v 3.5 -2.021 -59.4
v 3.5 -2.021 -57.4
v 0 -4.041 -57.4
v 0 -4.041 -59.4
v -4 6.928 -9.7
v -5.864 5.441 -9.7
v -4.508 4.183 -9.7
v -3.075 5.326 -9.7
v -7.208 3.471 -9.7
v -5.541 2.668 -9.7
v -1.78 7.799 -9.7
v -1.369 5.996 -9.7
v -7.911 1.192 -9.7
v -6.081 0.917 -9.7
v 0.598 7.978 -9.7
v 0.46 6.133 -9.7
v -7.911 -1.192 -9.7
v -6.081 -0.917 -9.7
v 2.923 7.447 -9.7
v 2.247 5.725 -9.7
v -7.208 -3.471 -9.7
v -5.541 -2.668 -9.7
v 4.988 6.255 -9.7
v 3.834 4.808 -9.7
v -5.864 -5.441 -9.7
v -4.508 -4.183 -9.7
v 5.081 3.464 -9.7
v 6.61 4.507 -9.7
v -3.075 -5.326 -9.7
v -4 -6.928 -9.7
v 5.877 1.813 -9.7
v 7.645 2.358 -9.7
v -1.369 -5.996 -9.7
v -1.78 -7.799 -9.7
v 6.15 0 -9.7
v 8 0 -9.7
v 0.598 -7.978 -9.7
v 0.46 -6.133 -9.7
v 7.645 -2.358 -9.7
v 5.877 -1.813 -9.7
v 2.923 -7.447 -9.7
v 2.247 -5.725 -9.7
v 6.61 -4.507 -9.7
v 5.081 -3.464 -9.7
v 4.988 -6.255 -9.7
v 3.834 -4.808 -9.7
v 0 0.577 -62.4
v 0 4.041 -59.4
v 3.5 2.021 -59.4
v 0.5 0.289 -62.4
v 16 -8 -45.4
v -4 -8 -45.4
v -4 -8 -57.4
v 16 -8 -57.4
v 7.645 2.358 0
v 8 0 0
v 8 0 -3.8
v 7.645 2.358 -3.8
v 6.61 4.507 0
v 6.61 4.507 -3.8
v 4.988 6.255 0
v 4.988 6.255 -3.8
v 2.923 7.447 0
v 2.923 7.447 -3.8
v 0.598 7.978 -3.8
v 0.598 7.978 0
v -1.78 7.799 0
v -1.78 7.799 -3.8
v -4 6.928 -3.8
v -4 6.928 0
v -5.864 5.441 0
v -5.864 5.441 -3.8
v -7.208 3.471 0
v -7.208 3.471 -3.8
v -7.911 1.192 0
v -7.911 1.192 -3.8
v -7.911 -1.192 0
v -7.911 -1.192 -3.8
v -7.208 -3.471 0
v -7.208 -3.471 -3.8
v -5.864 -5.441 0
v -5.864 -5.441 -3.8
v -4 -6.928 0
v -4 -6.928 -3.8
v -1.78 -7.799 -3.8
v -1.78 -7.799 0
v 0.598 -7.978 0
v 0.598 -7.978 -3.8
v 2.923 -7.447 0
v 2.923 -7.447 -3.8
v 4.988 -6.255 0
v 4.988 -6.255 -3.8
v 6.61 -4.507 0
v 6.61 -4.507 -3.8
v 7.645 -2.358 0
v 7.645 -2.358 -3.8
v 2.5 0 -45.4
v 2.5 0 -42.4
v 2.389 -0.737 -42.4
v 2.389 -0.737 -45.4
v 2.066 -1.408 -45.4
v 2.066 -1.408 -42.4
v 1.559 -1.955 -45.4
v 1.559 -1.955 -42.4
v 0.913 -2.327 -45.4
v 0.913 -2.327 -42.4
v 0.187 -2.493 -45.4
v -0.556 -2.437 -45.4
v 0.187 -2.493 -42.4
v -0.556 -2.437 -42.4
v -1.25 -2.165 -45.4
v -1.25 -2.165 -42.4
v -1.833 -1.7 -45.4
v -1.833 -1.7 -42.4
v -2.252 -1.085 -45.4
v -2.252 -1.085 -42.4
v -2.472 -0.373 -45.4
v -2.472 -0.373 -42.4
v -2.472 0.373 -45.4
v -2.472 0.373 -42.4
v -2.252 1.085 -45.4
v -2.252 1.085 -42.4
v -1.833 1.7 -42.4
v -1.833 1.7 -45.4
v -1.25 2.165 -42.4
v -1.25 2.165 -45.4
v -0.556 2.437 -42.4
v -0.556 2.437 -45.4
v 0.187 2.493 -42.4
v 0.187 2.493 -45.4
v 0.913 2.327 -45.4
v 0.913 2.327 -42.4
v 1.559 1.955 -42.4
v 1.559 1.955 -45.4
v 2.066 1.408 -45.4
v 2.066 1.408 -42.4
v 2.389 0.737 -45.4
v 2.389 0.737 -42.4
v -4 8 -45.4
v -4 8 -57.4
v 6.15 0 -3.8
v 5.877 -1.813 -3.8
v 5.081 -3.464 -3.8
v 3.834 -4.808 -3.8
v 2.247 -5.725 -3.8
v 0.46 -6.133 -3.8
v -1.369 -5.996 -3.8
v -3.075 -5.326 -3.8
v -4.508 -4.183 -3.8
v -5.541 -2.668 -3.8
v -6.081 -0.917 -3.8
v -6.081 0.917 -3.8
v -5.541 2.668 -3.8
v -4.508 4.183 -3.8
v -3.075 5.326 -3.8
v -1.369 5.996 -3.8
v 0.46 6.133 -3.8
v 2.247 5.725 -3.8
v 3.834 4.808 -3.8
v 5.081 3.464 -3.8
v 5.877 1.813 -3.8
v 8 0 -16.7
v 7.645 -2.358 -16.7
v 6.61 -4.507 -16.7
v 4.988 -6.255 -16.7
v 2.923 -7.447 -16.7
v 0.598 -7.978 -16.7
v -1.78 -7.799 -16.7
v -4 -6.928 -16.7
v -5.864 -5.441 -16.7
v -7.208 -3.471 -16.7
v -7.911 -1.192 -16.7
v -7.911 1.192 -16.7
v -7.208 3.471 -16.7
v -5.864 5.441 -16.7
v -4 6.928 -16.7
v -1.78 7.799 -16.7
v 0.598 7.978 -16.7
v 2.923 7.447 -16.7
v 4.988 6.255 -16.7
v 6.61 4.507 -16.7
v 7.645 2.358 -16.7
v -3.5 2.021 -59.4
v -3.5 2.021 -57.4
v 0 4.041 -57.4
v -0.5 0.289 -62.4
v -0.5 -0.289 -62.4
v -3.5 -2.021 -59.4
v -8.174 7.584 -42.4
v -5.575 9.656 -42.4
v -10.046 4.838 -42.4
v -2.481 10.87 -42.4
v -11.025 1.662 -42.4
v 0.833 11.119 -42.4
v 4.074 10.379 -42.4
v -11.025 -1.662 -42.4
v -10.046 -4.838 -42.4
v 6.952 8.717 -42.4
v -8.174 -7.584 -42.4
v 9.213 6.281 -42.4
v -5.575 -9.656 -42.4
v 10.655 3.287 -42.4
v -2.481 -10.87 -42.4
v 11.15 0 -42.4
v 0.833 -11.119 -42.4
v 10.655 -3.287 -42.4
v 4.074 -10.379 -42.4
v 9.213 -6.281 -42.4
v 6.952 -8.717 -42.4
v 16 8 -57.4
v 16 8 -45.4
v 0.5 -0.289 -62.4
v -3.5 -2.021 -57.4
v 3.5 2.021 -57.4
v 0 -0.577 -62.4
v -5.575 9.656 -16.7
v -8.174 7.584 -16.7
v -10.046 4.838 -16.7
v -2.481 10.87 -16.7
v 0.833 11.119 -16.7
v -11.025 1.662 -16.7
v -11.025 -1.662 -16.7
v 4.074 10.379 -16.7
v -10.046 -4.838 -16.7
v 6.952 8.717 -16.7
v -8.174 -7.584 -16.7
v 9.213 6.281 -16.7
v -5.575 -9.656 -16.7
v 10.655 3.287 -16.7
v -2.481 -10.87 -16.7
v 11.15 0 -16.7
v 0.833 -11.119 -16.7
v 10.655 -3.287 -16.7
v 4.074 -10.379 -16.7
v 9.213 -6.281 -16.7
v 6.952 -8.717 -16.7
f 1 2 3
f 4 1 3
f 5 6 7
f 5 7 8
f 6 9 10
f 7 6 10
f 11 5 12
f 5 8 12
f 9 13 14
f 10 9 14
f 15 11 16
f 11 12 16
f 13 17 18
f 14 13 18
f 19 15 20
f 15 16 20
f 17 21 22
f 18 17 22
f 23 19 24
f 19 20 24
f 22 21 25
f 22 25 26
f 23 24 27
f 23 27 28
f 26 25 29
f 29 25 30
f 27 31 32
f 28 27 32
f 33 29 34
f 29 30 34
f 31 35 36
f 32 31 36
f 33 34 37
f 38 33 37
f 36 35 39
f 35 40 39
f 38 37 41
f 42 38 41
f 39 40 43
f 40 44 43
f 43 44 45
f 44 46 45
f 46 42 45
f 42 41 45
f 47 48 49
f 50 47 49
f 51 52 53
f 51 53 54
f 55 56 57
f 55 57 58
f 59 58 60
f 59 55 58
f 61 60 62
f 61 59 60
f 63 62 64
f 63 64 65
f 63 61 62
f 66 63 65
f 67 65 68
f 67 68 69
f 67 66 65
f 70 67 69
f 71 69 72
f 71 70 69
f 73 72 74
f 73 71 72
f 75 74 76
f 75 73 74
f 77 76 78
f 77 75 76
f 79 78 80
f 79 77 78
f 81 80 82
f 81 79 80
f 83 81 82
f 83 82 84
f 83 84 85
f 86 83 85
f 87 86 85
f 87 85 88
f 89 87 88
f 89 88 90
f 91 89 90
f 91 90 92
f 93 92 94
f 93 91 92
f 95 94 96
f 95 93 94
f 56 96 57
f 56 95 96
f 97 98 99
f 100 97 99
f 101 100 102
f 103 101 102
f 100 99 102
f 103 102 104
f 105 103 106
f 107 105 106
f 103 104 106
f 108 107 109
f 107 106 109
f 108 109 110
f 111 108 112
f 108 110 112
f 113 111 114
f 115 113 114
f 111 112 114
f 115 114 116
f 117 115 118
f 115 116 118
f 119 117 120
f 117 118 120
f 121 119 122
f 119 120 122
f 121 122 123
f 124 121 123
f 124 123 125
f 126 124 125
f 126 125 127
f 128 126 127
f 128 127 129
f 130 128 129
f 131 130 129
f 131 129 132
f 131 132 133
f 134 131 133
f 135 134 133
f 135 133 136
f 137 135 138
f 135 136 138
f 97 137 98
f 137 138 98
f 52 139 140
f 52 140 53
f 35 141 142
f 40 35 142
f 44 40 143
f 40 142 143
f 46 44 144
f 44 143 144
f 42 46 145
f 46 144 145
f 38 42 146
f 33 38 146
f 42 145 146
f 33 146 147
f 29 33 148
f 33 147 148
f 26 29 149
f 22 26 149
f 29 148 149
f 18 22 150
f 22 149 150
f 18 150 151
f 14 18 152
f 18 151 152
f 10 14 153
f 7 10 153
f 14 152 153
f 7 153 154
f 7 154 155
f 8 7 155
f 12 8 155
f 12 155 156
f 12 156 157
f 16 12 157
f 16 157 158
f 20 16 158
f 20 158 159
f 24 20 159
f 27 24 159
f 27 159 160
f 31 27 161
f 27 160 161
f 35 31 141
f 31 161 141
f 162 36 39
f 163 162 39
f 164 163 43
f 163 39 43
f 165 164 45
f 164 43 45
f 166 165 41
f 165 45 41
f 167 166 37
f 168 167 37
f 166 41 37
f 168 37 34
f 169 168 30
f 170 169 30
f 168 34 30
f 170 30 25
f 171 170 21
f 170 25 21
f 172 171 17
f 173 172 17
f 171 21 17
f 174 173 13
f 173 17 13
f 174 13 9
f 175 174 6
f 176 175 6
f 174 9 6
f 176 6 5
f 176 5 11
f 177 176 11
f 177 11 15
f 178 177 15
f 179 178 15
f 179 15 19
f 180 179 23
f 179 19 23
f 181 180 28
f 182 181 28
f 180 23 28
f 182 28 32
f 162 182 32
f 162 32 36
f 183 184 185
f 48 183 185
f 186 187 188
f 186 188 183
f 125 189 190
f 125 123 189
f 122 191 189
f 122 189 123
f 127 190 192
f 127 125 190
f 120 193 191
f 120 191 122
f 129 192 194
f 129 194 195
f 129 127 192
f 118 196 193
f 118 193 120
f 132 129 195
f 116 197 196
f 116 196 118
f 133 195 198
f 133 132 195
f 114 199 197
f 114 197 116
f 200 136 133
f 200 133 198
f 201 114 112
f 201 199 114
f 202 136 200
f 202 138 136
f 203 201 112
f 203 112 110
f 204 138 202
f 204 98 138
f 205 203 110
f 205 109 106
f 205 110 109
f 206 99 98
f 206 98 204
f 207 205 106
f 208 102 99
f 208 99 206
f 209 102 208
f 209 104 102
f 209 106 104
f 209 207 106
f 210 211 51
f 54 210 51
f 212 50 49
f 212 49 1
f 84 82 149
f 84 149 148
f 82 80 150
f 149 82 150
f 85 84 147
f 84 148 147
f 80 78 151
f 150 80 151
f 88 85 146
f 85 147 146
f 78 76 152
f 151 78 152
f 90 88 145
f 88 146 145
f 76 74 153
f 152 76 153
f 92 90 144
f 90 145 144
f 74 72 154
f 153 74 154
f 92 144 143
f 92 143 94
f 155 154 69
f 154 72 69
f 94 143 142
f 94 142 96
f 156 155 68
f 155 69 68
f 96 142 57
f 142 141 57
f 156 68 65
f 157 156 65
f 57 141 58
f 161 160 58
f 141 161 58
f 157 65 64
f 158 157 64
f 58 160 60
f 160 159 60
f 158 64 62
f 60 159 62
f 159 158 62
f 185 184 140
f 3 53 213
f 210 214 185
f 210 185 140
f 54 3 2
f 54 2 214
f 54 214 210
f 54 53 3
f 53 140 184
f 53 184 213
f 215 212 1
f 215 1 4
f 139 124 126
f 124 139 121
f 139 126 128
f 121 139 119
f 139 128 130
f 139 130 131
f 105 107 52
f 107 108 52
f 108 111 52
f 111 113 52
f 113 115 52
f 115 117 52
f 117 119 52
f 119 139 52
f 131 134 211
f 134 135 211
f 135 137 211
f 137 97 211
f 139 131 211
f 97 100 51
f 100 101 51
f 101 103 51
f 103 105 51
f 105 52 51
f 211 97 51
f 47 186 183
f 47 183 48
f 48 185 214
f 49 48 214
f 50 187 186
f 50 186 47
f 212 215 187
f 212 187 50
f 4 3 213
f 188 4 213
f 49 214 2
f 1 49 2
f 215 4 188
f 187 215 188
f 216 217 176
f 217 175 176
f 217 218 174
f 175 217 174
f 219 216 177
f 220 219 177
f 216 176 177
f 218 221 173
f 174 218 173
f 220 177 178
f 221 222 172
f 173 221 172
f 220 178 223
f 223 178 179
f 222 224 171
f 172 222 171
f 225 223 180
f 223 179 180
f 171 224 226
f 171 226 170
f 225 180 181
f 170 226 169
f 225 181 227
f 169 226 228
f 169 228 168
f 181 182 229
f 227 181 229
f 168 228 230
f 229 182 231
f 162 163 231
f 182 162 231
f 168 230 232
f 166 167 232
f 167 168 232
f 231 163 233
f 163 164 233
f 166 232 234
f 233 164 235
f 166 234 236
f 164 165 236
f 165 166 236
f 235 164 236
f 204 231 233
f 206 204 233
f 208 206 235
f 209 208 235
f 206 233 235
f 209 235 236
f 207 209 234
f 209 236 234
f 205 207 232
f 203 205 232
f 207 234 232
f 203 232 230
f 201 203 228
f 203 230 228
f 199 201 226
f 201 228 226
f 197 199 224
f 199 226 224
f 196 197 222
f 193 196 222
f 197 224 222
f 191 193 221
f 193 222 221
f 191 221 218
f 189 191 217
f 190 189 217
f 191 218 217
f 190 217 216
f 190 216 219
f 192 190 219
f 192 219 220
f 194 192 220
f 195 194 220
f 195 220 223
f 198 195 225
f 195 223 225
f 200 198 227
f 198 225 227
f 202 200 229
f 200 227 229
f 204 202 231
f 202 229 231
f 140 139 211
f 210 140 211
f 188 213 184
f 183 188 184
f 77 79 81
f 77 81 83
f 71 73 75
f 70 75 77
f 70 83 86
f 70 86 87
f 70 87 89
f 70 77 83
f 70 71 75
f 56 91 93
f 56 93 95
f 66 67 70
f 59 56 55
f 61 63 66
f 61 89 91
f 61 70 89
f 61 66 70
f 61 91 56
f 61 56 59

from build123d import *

# Parameters (mm, degrees)
F0_R      = 8
F1_DEPTH  = 3.8
F2_R      = 6.15
F3_DEPTH  = 5.9
F4_R      = 8
F5_DEPTH  = 7
F6_R      = 11.15
F7_DEPTH  = 25.7
F8_R      = 2.5
F9_DEPTH  = 3
F10_W     = 20
F10_H     = 16
F10_R     = 2.5
F11_DEPTH = 12
F13_DEPTH = 5
F14_SIZE  = 3


with BuildPart() as f1:
    # F0 (on Top) → F1 (new body)
    with BuildSketch(Plane.XY):
        Circle(F0_R)
    extrude(amount=-F1_DEPTH)

    # F2 (on face) → F3 (join)
    with BuildSketch(Plane(origin=(0, 0, -3.8), x_dir=(1, 0, 0), z_dir=(0, 0, -1))):
        Circle(F2_R)
    extrude(amount=F3_DEPTH)

    # F4 (on face) → F5 (join)
    with BuildSketch(Plane(origin=(0, 0, -9.7), x_dir=(1, 0, 0), z_dir=(0, 0, -1))):
        Circle(F4_R)
    extrude(amount=F5_DEPTH)

    # F6 (on face) → F7 (join)
    with BuildSketch(Plane(origin=(0, 0, -16.7), x_dir=(1, 0, 0), z_dir=(0, 0, -1))):
        Circle(F6_R)
    extrude(amount=F7_DEPTH)

    # F8 (on face) → F9 (join)
    with BuildSketch(Plane(origin=(0, 0, -42.4), x_dir=(1, 0, 0), z_dir=(0, 0, -1))):
        Circle(F8_R)
    extrude(amount=F9_DEPTH)

    # F10 (on face) → F11 (join)
    with BuildSketch(Plane(origin=(0, 0, -45.4), x_dir=(1, 0, 0), z_dir=(0, 0, -1))):
        with Locations((6, 0)):
            Rectangle(F10_W, F10_H)
        Circle(F10_R, mode=Mode.SUBTRACT)
        Circle(F10_R)
    extrude(amount=F11_DEPTH)

    # F12 (on face) → F13 (join)
    with BuildSketch(Plane(origin=(0, 0, -57.4), x_dir=(1, 0, 0), z_dir=(0, 0, -1))):
        Polygon((0, -4.041452), (3.5, -2.020726), (3.5, 2.020726), (0, 4.041452), (-3.5, 2.020726), (-3.5, -2.020726), align=None)
    extrude(amount=F13_DEPTH)

    # F14
    f14_edges = [f1.edges().sort_by_distance(p)[0] for p in [
        (3.5, 0, -62.4),
        (1.75, -3.031089, -62.4),
        (-1.75, -3.031089, -62.4),
        (-3.5, 0, -62.4),
        (1.75, 3.031089, -62.4),
        (-1.75, 3.031089, -62.4),
    ]]
    chamfer(f14_edges, length=F14_SIZE)


solid = f1.part
